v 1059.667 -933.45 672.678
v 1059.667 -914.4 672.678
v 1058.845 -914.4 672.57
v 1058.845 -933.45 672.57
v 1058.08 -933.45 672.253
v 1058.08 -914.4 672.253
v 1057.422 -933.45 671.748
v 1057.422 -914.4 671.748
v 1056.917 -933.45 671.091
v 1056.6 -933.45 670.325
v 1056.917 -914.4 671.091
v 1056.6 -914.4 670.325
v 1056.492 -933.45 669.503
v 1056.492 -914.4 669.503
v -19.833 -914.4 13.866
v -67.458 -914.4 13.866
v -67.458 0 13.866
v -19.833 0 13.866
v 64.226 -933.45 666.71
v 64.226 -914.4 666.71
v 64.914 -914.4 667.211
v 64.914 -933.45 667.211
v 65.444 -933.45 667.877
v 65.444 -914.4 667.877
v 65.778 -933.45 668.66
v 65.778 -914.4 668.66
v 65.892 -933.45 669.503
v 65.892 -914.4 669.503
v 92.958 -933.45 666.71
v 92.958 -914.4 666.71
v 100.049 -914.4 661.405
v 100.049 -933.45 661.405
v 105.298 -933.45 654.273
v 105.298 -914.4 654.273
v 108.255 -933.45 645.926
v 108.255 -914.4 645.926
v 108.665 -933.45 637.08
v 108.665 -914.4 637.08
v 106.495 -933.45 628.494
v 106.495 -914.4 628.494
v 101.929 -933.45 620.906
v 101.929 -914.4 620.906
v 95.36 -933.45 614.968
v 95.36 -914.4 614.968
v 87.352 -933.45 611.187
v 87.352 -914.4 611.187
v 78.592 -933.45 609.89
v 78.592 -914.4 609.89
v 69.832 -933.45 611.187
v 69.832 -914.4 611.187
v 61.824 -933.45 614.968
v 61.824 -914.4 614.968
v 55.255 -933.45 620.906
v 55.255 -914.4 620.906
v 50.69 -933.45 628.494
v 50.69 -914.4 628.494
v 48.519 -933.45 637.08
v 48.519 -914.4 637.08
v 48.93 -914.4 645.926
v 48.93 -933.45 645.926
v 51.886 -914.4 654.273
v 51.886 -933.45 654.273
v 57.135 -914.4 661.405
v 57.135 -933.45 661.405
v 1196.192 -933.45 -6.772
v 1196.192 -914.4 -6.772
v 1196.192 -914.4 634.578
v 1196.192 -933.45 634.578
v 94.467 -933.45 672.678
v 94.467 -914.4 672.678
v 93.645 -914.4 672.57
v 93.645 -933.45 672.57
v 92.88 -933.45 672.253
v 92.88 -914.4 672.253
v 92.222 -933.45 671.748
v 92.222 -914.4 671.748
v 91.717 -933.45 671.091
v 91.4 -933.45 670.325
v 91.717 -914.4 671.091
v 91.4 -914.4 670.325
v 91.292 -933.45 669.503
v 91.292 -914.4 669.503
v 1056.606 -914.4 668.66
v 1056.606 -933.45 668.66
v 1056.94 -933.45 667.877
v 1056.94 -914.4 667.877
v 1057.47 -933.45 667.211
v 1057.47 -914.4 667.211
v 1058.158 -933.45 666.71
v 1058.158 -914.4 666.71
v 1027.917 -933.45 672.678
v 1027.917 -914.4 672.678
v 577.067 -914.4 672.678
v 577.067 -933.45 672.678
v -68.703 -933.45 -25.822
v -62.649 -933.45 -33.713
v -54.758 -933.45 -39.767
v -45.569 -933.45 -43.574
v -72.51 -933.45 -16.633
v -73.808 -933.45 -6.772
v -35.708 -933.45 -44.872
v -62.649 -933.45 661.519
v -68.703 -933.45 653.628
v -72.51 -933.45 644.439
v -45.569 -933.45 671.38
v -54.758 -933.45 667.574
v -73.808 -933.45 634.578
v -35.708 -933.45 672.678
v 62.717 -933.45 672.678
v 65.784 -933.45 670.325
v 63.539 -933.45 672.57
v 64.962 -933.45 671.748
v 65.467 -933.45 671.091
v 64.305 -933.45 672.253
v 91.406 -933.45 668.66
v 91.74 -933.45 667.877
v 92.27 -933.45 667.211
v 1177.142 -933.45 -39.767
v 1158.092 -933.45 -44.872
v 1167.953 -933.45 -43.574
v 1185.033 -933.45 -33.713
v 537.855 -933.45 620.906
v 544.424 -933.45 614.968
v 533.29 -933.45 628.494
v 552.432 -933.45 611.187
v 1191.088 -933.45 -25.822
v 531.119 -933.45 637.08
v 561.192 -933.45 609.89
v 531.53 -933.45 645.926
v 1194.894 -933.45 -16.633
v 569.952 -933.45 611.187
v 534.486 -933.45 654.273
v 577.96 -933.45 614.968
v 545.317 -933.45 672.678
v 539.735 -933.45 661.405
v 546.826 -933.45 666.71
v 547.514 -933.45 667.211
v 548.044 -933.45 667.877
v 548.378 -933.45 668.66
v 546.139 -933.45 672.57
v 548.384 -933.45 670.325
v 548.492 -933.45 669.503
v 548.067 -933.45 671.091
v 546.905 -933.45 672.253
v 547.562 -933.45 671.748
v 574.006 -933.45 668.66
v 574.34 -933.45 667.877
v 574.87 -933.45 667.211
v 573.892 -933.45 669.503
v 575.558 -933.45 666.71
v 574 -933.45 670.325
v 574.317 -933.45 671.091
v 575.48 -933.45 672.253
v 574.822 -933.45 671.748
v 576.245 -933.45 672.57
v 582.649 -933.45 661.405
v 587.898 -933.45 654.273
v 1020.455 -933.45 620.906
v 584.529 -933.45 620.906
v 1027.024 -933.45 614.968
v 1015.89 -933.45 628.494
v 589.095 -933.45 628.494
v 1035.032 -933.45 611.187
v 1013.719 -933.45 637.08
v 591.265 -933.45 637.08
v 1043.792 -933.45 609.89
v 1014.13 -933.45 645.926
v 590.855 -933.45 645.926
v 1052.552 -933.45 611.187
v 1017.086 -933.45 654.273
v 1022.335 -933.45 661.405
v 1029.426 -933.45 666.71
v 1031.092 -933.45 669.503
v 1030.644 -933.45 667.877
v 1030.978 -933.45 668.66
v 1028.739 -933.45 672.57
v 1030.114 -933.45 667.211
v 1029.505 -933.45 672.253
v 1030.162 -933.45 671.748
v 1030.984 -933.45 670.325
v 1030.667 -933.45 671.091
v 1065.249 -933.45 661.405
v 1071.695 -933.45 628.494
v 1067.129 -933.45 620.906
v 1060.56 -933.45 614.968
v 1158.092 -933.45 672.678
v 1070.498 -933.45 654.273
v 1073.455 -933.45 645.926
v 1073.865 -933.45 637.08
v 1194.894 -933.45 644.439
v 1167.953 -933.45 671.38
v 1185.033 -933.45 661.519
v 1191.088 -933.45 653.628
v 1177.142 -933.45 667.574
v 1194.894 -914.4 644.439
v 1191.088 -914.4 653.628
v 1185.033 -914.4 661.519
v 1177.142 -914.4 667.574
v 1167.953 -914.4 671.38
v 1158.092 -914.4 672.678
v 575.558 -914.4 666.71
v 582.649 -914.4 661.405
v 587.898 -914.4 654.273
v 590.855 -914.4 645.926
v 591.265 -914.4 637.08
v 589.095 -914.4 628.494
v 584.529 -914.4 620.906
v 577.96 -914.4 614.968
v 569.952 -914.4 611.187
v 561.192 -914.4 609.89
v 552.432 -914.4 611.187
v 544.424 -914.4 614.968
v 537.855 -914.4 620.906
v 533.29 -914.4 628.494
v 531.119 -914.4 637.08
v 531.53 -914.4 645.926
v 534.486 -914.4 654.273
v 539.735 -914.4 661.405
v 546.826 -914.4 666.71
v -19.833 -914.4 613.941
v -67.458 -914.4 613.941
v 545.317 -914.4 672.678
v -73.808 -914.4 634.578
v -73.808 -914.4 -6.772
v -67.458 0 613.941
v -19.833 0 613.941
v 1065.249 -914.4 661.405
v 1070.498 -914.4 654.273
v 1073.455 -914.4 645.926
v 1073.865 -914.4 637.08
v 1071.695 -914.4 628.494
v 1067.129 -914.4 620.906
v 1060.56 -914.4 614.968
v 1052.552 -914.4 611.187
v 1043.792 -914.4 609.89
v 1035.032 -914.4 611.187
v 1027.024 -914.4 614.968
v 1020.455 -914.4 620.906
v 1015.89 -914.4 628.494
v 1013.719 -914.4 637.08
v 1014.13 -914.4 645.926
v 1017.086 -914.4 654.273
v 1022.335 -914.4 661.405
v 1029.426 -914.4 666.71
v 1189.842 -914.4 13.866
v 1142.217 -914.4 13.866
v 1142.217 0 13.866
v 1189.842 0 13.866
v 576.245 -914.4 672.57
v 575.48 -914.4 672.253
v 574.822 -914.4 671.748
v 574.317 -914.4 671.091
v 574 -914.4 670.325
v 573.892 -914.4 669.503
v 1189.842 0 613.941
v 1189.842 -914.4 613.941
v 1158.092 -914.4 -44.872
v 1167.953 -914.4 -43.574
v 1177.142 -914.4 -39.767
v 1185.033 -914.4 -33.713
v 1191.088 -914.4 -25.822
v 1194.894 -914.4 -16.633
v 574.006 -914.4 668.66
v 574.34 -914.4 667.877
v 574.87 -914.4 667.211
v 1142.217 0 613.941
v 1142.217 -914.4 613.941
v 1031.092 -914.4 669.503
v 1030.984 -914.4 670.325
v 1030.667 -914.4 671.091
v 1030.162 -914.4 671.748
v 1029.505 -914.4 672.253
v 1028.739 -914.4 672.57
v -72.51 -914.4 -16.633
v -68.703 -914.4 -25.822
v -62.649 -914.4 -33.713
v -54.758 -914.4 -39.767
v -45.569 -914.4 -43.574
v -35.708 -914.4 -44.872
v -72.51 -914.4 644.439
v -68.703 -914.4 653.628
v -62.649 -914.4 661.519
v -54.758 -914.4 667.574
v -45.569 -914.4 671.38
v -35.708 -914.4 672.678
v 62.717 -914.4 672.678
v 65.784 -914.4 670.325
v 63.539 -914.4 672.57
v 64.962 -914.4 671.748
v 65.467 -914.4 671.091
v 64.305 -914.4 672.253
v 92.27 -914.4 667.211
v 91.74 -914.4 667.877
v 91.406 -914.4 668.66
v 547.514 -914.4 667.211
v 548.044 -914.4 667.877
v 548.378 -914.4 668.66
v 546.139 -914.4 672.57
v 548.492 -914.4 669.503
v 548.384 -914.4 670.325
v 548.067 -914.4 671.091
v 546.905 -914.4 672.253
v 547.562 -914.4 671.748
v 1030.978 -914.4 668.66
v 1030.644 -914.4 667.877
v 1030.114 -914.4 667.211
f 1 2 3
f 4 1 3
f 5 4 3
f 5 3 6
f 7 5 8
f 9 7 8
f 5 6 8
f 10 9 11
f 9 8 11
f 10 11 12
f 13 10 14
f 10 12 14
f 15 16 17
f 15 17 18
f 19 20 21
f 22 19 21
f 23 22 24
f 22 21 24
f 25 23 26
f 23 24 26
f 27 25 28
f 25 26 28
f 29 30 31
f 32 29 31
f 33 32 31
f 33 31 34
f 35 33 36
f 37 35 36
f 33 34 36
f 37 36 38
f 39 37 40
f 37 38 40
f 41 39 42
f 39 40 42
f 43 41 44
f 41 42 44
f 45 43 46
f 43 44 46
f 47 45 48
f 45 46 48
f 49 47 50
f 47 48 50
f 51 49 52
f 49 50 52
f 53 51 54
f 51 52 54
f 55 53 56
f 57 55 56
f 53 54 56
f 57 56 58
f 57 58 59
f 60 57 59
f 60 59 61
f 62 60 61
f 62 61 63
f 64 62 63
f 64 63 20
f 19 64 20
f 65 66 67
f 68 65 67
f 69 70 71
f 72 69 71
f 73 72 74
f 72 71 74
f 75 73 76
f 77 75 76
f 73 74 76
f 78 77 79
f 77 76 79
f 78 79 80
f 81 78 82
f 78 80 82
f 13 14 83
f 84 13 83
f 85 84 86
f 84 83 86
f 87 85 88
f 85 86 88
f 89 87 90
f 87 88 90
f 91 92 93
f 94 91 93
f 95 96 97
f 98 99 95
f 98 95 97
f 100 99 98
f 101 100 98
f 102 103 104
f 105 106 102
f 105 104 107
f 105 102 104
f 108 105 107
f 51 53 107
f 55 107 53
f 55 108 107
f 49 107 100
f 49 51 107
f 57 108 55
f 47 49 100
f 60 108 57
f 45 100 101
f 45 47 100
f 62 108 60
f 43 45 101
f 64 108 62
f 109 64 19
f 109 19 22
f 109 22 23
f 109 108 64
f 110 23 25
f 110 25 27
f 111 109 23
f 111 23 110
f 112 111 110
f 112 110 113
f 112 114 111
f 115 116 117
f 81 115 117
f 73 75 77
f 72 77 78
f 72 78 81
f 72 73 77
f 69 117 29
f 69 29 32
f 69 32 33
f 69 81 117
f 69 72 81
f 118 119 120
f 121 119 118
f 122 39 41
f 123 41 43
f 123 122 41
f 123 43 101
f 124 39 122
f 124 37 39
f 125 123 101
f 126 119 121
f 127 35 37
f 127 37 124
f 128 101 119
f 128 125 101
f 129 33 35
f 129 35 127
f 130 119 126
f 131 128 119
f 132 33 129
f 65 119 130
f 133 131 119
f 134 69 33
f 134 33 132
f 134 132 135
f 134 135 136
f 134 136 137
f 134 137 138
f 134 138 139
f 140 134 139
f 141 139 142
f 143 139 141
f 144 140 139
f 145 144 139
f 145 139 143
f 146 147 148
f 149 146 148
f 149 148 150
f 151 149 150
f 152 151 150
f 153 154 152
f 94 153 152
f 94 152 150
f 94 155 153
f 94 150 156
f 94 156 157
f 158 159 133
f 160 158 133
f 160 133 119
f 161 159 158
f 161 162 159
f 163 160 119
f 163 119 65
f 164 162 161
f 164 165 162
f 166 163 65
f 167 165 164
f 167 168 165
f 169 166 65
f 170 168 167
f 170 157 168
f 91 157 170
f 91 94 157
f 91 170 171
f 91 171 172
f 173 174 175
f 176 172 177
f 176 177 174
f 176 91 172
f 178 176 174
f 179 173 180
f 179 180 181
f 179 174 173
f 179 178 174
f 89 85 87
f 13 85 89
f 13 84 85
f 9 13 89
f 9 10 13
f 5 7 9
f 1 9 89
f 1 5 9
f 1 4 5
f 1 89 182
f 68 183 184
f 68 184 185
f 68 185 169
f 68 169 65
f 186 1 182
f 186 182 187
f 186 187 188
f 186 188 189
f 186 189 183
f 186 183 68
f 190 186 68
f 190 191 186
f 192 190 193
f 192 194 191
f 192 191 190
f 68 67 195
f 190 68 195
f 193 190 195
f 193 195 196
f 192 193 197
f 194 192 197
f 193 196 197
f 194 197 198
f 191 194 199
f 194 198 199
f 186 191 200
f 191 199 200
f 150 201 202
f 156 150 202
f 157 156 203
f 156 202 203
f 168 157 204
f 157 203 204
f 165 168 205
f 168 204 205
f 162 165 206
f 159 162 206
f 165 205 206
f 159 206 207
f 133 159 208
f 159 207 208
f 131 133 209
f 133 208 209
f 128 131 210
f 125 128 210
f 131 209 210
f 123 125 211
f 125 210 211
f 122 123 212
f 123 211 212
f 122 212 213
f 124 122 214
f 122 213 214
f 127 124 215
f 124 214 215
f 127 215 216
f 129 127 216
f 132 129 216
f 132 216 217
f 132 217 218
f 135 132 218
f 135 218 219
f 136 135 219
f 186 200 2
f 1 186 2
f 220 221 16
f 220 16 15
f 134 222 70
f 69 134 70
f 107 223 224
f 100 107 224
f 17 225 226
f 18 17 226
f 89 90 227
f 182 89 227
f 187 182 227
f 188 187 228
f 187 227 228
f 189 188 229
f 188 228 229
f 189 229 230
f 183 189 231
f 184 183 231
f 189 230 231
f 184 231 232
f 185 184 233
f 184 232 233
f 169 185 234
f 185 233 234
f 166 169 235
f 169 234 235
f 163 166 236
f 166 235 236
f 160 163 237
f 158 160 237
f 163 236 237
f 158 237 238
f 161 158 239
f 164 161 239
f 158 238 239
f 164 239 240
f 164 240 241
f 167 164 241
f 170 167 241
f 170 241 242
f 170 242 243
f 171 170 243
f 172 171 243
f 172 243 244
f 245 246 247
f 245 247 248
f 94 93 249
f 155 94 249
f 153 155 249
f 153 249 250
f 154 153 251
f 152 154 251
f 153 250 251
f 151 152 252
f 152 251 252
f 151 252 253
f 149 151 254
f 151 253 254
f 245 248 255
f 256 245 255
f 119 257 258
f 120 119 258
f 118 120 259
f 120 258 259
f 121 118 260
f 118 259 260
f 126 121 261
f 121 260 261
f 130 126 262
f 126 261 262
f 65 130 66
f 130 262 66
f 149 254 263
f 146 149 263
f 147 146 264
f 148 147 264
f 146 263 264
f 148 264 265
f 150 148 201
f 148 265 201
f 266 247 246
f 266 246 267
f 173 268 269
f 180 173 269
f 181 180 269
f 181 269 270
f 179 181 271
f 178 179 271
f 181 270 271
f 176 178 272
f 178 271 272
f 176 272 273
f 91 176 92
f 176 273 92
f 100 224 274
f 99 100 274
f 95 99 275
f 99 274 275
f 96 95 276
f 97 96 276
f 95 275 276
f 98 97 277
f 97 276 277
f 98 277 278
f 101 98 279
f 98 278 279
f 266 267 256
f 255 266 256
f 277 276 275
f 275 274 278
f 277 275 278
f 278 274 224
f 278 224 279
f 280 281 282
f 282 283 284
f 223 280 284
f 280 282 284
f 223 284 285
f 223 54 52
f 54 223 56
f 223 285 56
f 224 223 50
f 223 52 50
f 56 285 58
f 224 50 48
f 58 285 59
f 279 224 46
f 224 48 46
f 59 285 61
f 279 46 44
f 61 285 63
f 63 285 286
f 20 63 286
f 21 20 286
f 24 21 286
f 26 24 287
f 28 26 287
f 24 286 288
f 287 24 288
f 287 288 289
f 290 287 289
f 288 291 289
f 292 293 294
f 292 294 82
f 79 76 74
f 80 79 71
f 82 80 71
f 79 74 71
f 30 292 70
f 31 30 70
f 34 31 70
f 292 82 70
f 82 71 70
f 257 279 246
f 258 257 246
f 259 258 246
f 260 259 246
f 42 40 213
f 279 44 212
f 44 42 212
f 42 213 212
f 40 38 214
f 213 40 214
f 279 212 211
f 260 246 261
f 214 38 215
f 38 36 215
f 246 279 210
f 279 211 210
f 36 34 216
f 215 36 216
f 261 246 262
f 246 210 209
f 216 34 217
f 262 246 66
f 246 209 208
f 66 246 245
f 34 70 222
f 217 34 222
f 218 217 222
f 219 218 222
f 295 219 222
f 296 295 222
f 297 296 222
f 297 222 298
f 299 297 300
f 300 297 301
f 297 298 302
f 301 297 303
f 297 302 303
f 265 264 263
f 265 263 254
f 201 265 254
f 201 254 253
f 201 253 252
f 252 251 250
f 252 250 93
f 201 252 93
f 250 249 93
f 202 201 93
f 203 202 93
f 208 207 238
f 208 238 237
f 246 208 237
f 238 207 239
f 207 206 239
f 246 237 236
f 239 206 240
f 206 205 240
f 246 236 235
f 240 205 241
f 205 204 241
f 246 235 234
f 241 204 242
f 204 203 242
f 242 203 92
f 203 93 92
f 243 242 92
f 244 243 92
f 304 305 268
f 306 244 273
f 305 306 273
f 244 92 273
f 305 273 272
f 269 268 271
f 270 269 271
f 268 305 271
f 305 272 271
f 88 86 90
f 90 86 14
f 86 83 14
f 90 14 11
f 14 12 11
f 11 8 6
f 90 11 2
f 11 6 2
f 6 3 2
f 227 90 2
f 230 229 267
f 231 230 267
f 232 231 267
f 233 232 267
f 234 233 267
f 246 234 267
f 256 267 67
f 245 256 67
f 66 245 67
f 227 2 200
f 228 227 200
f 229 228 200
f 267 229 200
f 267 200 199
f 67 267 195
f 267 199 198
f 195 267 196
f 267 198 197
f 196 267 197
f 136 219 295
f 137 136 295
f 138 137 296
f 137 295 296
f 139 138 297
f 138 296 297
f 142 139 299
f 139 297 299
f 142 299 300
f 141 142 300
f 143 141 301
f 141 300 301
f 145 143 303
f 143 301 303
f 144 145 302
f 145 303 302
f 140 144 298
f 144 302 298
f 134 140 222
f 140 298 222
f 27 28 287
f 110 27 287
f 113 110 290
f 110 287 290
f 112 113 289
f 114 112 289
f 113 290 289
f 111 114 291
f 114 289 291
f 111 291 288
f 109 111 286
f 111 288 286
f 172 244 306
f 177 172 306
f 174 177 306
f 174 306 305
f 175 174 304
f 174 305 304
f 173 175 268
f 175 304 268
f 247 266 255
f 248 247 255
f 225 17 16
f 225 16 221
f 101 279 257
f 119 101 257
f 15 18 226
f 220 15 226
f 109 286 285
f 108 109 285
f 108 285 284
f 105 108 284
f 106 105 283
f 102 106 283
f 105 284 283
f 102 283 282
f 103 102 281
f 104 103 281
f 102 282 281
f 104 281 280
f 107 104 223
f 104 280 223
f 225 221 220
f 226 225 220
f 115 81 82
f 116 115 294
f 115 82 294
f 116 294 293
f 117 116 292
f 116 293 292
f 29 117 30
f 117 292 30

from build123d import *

# Parameters (mm, degrees)
F0_W     = 47.625
F0_H     = 600.075
F1_DEPTH = 914.4
F2_W     = 47.625
F2_H     = 600.075
F3_DEPTH = 19.05


# Not quite as in the source:
# - ends of sketch curves that miss each other by under 0.0002 mm in the source are joined


with BuildPart() as f1:
    # F0 (on Front) → F1 (new body)
    with BuildSketch(Plane.XZ):
        with Locations((-43.6453819275, 313.9032570556)):
            Rectangle(F0_W, F0_H)
    extrude(amount=F1_DEPTH)


with BuildPart() as f1b:
    # F0 (on Front) → F1, piece 2 (new body)
    with BuildSketch(Plane.XZ):
        with Locations((1166.0296180725, 313.9032570556)):
            Rectangle(F0_W, F0_H)
    extrude(amount=F1_DEPTH)

    # F2 (on face) → F3 (join)
    with BuildSketch(Plane.XZ.offset(914.4)):
        with BuildLine():
            Line((62.7171180725, 672.6782570556), (-35.7078819275, 672.6782570556))
            ThreePointArc((-35.7078819275, 672.6782570556), (-62.6486502907, 661.5190254188), (-73.8078819275, 634.5782570556))
            Line((-73.8078819275, 634.5782570556), (-73.8078819275, -6.7717429444))
            ThreePointArc((-73.8078819275, -6.7717429444), (-62.6486502907, -33.7125113076), (-35.7078819275, -44.8717429444))
            Line((-35.7078819275, -44.8717429444), (1158.0921180725, -44.8717429444))
            ThreePointArc((1158.0921180725, -44.8717429444), (1185.0328864357, -33.7125113076), (1196.1921180725, -6.7717429444))
            Line((1196.1921180725, -6.7717429444), (1196.1921180725, 634.5782570556))
            ThreePointArc((1196.1921180725, 634.5782570556), (1185.0328864357, 661.5190254188), (1158.0921180725, 672.6782570556))
            Line((1158.0921180725, 672.6782570556), (1059.6671180725, 672.6782570556))
            ThreePointArc((1059.6671180725, 672.6782570556), (1057.4220540422, 671.7483210859), (1056.4921180725, 669.5032570556))
            ThreePointArc((1056.4921180725, 669.5032570556), (1056.9402337169, 667.8769954804), (1058.1580876543, 666.7097910729))
            ThreePointArc((1058.1580876543, 666.7097910729), (1043.7921180725, 609.8899949171), (1029.4261484908, 666.7097910729))
            ThreePointArc((1029.4261484908, 666.7097910729), (1030.6440024281, 667.8769954804), (1031.0921180725, 669.5032570556))
            ThreePointArc((1031.0921180725, 669.5032570556), (1030.1621821028, 671.7483210859), (1027.9171180725, 672.6782570556))
            Line((1027.9171180725, 672.6782570556), (577.0670724869, 672.6782570556))
            ThreePointArc((577.0670724869, 672.6782570556), (574.8220084566, 671.7483210859), (573.8920724869, 669.5032570556))
            ThreePointArc((573.8920724869, 669.5032570556), (574.3401881312, 667.8769954804), (575.5580420686, 666.7097910729))
            ThreePointArc((575.5580420686, 666.7097910729), (561.1921180725, 609.8899949171), (546.8261484908, 666.7097910729))
            ThreePointArc((546.8261484908, 666.7097910729), (548.0439568425, 667.8769954804), (548.4920724869, 669.5032570556))
            ThreePointArc((548.4920724869, 669.5032570556), (547.5621365171, 671.7483210859), (545.3170724869, 672.6782570556))
            Line((545.3170724869, 672.6782570556), (94.4671180725, 672.6782570556))
            ThreePointArc((94.4671180725, 672.6782570556), (92.2220540422, 671.7483210859), (91.2921180725, 669.5032570556))
            ThreePointArc((91.2921180725, 669.5032570556), (91.7402337169, 667.8769954804), (92.9580876543, 666.7097910729))
            ThreePointArc((92.9580876543, 666.7097910729), (78.5921180725, 609.8899949171), (64.2261484908, 666.7097910729))
            ThreePointArc((64.2261484908, 666.7097910729), (65.4440024281, 667.8769954804), (65.8921180725, 669.5032570556))
            ThreePointArc((65.8921180725, 669.5032570556), (64.9621821028, 671.7483210859), (62.7171180725, 672.6782570556))
        make_face()
        with Locations((-43.6453819275, 313.9032570556)):
            Rectangle(F2_W, F2_H, mode=Mode.SUBTRACT)
        with Locations((-43.6453819275, 313.9032570556)):
            Rectangle(F2_W, F2_H)
    extrude(amount=F3_DEPTH)


solid = Compound([f1.part, f1b.part])
